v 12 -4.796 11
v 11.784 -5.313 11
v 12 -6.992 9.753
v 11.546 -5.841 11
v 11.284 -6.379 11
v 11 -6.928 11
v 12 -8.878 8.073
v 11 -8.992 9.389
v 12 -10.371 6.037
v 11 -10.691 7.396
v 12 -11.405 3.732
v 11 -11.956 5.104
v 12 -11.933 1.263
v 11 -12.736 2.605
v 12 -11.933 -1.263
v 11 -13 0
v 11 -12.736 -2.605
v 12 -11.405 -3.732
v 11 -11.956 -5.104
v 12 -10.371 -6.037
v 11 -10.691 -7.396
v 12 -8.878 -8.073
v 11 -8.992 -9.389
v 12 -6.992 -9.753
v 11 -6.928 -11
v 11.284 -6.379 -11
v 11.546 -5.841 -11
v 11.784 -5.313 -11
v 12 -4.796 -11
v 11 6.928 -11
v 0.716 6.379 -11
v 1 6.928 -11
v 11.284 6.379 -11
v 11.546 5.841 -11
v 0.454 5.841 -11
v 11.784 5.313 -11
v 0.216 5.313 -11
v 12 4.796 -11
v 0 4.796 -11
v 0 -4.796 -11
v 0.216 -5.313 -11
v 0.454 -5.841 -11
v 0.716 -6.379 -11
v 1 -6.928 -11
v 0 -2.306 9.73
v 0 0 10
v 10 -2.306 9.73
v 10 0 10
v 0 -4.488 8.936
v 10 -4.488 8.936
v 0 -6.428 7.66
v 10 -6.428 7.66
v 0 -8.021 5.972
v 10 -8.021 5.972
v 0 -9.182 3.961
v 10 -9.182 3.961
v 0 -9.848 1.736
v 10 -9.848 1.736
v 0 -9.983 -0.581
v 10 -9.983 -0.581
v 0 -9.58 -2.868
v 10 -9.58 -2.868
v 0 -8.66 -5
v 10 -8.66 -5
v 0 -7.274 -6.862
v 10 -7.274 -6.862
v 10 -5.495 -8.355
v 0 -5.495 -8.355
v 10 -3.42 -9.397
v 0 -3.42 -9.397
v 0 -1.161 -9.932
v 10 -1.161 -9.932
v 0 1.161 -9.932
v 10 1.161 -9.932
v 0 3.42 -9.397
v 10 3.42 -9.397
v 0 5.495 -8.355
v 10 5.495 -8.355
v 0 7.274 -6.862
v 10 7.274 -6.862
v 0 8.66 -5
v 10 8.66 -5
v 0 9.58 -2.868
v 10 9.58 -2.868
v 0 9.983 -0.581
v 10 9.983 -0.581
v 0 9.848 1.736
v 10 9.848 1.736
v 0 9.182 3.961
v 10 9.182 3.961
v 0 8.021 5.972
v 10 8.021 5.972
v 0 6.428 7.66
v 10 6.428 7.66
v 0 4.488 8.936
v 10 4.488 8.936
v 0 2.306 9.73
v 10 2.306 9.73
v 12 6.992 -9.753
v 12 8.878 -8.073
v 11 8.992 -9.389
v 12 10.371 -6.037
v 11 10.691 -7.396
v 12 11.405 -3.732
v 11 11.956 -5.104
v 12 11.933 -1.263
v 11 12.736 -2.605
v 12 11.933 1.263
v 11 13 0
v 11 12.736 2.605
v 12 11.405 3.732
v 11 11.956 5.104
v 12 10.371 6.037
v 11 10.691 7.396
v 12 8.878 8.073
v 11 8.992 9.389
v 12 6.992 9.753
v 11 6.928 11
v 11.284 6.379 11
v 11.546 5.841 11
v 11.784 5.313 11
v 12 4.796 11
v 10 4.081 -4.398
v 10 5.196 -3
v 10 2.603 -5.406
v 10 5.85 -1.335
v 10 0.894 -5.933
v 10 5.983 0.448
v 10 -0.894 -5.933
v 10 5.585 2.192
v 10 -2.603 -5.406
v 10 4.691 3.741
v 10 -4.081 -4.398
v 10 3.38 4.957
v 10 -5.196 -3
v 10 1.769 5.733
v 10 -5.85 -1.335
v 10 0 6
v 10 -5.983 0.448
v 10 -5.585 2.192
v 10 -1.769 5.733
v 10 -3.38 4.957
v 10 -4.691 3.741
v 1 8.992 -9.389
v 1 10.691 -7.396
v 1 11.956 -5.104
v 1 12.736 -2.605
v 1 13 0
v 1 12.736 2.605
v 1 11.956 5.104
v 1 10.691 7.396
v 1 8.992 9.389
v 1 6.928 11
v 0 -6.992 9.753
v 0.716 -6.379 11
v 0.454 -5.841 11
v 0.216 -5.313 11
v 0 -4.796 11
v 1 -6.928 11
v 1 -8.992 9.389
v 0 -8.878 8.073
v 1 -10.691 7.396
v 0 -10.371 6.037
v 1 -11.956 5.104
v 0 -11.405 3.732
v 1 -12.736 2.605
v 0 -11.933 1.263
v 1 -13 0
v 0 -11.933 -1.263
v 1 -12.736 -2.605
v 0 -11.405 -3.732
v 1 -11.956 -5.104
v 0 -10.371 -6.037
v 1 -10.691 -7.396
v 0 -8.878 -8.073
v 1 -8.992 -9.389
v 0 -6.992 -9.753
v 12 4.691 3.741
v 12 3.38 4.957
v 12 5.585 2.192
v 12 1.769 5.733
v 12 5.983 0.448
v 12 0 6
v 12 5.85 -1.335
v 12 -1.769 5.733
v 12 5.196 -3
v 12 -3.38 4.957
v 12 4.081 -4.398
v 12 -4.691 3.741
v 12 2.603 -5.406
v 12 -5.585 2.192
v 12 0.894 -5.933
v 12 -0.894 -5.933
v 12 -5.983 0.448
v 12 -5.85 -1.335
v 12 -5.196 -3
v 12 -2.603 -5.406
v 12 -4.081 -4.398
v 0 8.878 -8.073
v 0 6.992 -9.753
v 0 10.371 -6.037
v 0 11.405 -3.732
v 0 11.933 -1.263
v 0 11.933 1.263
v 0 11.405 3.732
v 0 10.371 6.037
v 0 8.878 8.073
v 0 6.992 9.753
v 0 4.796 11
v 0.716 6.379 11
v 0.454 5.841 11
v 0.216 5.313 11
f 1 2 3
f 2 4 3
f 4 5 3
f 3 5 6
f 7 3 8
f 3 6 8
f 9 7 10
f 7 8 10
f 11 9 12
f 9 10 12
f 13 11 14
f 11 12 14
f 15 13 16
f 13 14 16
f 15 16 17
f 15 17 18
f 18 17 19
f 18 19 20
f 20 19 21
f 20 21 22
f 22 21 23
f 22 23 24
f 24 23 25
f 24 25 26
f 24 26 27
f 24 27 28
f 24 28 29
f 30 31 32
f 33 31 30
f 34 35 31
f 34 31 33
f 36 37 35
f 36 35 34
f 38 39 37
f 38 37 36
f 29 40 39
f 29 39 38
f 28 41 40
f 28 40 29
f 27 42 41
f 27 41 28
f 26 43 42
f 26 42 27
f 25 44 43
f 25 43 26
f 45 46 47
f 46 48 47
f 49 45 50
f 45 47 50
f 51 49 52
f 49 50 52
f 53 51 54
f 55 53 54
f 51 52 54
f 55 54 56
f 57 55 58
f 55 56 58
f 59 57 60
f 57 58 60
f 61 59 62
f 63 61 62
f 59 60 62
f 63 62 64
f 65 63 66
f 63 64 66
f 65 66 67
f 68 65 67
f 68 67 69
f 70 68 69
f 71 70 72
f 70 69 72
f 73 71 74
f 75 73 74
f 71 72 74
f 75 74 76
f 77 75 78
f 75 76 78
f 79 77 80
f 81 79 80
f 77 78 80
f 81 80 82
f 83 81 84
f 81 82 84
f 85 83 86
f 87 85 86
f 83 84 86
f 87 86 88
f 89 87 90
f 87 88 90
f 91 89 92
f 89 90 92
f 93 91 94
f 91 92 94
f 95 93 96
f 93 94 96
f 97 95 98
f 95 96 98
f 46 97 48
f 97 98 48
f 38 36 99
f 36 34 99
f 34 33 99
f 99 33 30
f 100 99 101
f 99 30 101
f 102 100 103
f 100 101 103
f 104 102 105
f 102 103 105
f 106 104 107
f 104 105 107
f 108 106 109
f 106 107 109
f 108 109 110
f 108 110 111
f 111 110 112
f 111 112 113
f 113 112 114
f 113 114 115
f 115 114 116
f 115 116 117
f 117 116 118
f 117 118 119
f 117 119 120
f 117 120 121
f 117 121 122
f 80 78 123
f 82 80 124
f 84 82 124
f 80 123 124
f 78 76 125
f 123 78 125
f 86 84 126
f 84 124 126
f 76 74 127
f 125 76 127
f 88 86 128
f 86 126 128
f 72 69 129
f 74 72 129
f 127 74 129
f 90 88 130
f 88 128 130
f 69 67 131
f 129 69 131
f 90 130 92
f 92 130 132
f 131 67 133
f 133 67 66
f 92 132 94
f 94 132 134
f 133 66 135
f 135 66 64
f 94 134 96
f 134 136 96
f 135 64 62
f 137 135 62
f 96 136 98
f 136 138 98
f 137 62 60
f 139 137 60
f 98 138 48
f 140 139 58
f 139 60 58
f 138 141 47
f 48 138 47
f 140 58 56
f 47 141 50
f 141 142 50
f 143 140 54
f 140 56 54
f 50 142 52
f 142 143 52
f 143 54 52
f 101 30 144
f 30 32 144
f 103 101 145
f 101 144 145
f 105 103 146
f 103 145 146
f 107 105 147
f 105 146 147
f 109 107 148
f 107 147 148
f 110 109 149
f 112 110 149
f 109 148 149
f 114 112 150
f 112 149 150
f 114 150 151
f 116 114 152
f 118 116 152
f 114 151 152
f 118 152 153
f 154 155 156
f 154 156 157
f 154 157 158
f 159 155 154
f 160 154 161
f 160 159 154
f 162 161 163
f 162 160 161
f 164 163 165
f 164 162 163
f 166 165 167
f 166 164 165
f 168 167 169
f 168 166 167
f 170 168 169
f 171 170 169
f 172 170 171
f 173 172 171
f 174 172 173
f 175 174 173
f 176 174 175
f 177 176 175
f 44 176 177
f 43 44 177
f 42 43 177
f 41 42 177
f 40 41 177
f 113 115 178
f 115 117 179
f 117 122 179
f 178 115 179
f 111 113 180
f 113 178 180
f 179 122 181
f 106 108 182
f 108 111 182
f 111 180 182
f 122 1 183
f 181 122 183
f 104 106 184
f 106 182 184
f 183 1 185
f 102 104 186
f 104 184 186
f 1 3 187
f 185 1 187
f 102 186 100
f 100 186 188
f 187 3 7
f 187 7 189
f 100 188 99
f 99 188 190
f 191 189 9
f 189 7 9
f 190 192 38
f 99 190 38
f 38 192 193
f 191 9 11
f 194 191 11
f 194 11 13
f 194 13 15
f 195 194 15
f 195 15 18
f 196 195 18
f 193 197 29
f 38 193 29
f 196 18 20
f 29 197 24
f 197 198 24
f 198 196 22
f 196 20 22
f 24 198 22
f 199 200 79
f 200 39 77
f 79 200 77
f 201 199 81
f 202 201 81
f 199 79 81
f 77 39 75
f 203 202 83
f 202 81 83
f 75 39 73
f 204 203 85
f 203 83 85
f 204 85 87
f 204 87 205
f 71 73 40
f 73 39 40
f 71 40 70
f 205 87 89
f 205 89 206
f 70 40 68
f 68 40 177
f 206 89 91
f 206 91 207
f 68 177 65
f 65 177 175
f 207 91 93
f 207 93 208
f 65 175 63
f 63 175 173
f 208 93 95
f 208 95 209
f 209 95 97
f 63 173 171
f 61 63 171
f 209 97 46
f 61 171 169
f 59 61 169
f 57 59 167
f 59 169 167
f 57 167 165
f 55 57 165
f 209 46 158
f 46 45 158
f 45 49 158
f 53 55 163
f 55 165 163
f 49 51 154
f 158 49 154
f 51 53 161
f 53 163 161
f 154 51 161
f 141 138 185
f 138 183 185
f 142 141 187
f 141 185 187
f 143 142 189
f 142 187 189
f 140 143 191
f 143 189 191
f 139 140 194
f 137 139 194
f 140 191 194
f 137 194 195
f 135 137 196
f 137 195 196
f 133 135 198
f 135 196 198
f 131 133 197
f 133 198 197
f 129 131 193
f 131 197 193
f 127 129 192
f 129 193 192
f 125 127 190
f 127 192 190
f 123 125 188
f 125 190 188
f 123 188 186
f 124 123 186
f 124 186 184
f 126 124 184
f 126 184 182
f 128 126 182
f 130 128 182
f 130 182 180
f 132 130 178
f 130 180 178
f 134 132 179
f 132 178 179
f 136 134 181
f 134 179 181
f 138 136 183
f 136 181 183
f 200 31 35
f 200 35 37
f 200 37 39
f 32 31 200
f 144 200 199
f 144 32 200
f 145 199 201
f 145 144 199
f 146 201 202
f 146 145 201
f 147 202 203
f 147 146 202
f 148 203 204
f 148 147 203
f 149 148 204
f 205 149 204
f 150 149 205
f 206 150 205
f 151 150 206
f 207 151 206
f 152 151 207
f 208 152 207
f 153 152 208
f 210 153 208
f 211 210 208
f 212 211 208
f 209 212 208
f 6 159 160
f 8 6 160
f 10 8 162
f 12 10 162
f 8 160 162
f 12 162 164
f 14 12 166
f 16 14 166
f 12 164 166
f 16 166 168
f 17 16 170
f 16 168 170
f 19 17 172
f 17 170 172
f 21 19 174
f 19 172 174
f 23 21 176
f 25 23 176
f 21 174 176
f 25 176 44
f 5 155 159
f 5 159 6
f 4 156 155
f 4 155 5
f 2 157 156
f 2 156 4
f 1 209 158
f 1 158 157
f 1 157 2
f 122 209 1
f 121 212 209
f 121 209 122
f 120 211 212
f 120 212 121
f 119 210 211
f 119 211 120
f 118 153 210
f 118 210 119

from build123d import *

# Parameters (mm, degrees)
F2_SIZE  = 1
F3_W     = 15.3355175093
F3_H     = 4.7520212233
F3_W_2   = 15.3147058821
F3_H_2   = 7.7273081392
F4_DEPTH = 12.5


with BuildPart() as f1:
    # F0 (on Front) → F1 (revolve)
    with BuildSketch(Plane.XZ):
        Polygon((0, 13), (0, 10), (10, 10), (10, 6), (12, 6), (12, 13), align=None)
    revolve(axis=Axis((0.2130177937, 0, 0), (1, 0, 0)))

    # F2
    f2_edges = [f1.edges().sort_by_distance(p)[0] for p in [
        (12, 0, -13),
        (0, 0, -13),
    ]]
    chamfer(f2_edges, length=F2_SIZE)

    # F3 (on Front) → F4 (cut, symmetric)
    with BuildSketch(Plane.XZ):
        with Locations((7.1024957381, 13.3760106117)):
            Rectangle(F3_W, F3_H)
        with Locations((7.2143123355, -14.8636540696)):
            Rectangle(F3_W_2, F3_H_2)
    extrude(amount=F4_DEPTH, both=True, mode=Mode.SUBTRACT)


solid = f1.part
